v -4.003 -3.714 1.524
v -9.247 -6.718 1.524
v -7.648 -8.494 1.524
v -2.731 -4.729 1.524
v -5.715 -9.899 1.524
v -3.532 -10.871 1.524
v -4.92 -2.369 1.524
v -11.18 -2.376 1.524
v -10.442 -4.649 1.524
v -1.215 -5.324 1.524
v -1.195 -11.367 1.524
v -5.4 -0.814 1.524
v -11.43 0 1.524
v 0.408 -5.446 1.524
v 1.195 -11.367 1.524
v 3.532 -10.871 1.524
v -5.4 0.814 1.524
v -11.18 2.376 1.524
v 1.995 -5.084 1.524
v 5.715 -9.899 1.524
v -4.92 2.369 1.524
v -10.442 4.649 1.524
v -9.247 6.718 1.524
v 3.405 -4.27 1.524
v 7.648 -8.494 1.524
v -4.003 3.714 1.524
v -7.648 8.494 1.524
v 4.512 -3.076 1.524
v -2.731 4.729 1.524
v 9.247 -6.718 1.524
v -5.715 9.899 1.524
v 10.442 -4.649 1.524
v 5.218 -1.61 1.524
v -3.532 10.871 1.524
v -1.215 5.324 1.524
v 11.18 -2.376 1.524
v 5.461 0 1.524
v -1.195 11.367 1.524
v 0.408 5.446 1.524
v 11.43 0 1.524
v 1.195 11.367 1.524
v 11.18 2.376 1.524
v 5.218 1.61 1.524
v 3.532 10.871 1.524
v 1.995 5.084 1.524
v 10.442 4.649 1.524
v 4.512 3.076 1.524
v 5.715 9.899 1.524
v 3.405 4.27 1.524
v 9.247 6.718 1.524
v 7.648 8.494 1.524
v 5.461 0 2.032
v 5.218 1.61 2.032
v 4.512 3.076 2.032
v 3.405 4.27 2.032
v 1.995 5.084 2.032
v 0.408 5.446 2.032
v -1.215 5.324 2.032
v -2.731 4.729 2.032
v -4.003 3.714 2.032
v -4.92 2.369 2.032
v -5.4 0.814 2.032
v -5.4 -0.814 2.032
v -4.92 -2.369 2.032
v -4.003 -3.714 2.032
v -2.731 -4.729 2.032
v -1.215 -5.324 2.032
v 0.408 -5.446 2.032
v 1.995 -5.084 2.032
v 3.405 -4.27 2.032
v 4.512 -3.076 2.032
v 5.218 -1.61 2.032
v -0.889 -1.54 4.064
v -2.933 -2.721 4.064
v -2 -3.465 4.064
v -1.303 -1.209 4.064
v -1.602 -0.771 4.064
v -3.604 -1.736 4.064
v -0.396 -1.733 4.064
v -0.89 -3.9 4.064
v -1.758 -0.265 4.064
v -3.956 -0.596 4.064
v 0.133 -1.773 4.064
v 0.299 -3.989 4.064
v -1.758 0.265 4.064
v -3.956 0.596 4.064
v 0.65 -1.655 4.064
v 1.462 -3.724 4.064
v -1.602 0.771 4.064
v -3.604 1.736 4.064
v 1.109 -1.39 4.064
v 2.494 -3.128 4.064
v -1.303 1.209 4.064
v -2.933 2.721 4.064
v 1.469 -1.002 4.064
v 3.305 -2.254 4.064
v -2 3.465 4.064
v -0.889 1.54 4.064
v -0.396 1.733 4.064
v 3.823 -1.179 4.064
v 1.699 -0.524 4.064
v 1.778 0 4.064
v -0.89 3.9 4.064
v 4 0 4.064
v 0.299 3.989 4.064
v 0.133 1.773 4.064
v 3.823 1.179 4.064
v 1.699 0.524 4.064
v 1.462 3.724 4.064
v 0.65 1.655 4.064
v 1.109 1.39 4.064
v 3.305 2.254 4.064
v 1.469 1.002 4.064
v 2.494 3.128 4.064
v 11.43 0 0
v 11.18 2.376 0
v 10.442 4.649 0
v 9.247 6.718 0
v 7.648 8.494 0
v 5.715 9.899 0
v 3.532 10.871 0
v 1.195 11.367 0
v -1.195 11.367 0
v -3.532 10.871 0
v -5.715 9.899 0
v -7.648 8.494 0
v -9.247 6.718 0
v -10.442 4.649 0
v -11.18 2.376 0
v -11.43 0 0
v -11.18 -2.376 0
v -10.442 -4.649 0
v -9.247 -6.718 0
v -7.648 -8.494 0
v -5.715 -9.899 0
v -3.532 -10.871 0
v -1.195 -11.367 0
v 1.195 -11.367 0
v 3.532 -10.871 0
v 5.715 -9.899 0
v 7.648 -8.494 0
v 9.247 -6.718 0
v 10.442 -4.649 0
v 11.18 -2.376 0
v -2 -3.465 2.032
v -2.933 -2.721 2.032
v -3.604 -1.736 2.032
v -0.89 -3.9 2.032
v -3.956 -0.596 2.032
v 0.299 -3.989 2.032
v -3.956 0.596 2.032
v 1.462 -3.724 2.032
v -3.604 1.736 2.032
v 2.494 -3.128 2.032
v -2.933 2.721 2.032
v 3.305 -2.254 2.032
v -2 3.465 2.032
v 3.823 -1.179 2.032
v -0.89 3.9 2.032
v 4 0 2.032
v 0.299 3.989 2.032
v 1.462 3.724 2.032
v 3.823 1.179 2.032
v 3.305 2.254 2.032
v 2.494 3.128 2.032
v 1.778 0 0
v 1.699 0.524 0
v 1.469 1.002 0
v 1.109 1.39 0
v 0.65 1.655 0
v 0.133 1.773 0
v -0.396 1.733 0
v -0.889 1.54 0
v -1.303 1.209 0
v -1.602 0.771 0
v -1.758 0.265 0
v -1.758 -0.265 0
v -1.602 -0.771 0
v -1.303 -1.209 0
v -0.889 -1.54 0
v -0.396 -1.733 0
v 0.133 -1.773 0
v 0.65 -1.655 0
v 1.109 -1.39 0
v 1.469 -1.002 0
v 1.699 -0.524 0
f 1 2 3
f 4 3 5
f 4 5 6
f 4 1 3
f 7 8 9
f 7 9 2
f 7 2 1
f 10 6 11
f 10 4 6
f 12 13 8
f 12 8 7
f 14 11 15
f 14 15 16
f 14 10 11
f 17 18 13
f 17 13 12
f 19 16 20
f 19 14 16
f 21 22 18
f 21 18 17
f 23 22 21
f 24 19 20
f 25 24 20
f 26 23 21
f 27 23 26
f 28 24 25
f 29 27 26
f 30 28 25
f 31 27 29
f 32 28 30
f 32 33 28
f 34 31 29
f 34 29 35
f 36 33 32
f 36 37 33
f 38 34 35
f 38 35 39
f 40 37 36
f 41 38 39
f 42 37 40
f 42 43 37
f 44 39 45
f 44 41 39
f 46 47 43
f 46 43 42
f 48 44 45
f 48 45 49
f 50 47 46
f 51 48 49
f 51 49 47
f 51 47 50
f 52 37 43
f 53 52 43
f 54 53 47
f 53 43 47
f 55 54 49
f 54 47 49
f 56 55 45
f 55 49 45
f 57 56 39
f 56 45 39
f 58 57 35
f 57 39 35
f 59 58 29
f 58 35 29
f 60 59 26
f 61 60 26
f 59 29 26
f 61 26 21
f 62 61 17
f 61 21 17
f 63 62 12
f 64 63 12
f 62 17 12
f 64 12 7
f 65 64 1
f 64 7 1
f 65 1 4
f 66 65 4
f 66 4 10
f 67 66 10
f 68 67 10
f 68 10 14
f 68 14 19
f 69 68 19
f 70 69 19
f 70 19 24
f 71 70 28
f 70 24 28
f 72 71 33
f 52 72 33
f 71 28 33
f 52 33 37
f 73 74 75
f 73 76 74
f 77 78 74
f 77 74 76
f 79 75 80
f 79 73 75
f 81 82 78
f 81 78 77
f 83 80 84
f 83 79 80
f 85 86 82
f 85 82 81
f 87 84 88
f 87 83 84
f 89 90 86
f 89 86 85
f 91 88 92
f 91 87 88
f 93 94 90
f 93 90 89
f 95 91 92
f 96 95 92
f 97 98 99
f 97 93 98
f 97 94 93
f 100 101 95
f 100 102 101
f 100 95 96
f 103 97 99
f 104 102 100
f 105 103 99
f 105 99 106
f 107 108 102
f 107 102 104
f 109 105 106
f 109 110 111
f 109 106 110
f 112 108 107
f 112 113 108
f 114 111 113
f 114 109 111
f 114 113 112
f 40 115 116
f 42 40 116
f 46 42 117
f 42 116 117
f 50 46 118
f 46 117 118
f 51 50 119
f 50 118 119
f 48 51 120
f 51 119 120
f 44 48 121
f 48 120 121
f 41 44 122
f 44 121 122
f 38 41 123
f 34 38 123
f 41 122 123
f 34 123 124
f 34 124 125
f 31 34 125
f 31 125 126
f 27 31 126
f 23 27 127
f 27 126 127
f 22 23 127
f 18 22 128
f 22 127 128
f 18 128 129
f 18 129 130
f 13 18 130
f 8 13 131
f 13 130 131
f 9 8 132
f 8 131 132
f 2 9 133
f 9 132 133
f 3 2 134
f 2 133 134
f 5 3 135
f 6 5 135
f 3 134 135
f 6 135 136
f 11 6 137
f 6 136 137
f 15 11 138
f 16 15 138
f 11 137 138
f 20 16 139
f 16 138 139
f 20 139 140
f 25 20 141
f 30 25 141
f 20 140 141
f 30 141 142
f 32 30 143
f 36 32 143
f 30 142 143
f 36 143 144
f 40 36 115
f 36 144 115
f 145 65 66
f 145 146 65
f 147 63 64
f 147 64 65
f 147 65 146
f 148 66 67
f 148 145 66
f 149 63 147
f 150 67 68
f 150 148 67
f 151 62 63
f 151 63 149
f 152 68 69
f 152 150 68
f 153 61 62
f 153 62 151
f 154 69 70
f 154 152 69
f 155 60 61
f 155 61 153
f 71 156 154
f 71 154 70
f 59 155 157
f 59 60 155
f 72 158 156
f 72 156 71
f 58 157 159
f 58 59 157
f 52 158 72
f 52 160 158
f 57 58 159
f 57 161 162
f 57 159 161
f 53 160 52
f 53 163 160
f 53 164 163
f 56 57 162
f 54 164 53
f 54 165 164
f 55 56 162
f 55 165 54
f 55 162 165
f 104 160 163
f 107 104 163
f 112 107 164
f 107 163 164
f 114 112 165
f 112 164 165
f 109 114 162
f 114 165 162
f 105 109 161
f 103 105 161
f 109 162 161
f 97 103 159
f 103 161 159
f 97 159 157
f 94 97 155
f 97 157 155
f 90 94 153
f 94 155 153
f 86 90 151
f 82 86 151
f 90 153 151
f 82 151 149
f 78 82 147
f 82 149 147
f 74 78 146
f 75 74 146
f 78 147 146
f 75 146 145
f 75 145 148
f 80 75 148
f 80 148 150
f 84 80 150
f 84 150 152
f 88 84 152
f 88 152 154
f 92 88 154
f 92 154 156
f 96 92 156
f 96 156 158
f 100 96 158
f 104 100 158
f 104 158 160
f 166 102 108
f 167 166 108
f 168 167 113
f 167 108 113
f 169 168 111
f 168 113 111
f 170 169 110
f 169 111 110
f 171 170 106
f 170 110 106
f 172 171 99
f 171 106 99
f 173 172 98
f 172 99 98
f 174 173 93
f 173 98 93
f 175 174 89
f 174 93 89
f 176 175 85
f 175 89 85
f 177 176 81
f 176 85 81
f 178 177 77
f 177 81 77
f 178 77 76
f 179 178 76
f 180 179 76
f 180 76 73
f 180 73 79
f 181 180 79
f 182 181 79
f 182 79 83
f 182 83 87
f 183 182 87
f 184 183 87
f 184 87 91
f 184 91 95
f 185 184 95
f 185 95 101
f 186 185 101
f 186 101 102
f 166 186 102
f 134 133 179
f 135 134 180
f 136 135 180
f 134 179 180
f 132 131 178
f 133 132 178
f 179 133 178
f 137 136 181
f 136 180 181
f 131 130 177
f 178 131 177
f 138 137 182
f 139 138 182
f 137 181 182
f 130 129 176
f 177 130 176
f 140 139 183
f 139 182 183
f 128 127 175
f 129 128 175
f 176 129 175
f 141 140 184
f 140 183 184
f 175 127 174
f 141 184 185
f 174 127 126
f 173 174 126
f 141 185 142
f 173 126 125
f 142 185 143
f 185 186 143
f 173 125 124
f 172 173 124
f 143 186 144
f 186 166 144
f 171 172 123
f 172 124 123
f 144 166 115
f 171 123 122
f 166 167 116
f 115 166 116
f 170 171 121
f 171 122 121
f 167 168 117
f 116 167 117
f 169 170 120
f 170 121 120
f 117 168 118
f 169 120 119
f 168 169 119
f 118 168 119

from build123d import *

# Parameters (mm, degrees)
F0_R     = 11.43
F1_DEPTH = 1.524
F2_R     = 4.0005
F3_DEPTH = 2.54
F4_R     = 1.778
F5_DEPTH = 25.4
F6_R     = 5.461
F6_R_2   = 4.0005
F7_DEPTH = 0.508


with BuildPart() as f1:
    # F0 (on Top) → F1 (new body)
    with BuildSketch(Plane.XY):
        Circle(F0_R)
    extrude(amount=F1_DEPTH)

    # F2 (on face) → F3 (join)
    with BuildSketch(Plane.XY.offset(1.524)):
        Circle(F2_R)
    extrude(amount=F3_DEPTH)

    # F4 (on face) → F5 (cut)
    with BuildSketch(Plane.XY.offset(4.064)):
        Circle(F4_R)
    extrude(amount=-F5_DEPTH, mode=Mode.SUBTRACT)

    # F6 (on face) → F7 (join)
    with BuildSketch(Plane.XY.offset(1.524)):
        Circle(F6_R)
        Circle(F6_R_2, mode=Mode.SUBTRACT)
    extrude(amount=F7_DEPTH)


solid = f1.part
